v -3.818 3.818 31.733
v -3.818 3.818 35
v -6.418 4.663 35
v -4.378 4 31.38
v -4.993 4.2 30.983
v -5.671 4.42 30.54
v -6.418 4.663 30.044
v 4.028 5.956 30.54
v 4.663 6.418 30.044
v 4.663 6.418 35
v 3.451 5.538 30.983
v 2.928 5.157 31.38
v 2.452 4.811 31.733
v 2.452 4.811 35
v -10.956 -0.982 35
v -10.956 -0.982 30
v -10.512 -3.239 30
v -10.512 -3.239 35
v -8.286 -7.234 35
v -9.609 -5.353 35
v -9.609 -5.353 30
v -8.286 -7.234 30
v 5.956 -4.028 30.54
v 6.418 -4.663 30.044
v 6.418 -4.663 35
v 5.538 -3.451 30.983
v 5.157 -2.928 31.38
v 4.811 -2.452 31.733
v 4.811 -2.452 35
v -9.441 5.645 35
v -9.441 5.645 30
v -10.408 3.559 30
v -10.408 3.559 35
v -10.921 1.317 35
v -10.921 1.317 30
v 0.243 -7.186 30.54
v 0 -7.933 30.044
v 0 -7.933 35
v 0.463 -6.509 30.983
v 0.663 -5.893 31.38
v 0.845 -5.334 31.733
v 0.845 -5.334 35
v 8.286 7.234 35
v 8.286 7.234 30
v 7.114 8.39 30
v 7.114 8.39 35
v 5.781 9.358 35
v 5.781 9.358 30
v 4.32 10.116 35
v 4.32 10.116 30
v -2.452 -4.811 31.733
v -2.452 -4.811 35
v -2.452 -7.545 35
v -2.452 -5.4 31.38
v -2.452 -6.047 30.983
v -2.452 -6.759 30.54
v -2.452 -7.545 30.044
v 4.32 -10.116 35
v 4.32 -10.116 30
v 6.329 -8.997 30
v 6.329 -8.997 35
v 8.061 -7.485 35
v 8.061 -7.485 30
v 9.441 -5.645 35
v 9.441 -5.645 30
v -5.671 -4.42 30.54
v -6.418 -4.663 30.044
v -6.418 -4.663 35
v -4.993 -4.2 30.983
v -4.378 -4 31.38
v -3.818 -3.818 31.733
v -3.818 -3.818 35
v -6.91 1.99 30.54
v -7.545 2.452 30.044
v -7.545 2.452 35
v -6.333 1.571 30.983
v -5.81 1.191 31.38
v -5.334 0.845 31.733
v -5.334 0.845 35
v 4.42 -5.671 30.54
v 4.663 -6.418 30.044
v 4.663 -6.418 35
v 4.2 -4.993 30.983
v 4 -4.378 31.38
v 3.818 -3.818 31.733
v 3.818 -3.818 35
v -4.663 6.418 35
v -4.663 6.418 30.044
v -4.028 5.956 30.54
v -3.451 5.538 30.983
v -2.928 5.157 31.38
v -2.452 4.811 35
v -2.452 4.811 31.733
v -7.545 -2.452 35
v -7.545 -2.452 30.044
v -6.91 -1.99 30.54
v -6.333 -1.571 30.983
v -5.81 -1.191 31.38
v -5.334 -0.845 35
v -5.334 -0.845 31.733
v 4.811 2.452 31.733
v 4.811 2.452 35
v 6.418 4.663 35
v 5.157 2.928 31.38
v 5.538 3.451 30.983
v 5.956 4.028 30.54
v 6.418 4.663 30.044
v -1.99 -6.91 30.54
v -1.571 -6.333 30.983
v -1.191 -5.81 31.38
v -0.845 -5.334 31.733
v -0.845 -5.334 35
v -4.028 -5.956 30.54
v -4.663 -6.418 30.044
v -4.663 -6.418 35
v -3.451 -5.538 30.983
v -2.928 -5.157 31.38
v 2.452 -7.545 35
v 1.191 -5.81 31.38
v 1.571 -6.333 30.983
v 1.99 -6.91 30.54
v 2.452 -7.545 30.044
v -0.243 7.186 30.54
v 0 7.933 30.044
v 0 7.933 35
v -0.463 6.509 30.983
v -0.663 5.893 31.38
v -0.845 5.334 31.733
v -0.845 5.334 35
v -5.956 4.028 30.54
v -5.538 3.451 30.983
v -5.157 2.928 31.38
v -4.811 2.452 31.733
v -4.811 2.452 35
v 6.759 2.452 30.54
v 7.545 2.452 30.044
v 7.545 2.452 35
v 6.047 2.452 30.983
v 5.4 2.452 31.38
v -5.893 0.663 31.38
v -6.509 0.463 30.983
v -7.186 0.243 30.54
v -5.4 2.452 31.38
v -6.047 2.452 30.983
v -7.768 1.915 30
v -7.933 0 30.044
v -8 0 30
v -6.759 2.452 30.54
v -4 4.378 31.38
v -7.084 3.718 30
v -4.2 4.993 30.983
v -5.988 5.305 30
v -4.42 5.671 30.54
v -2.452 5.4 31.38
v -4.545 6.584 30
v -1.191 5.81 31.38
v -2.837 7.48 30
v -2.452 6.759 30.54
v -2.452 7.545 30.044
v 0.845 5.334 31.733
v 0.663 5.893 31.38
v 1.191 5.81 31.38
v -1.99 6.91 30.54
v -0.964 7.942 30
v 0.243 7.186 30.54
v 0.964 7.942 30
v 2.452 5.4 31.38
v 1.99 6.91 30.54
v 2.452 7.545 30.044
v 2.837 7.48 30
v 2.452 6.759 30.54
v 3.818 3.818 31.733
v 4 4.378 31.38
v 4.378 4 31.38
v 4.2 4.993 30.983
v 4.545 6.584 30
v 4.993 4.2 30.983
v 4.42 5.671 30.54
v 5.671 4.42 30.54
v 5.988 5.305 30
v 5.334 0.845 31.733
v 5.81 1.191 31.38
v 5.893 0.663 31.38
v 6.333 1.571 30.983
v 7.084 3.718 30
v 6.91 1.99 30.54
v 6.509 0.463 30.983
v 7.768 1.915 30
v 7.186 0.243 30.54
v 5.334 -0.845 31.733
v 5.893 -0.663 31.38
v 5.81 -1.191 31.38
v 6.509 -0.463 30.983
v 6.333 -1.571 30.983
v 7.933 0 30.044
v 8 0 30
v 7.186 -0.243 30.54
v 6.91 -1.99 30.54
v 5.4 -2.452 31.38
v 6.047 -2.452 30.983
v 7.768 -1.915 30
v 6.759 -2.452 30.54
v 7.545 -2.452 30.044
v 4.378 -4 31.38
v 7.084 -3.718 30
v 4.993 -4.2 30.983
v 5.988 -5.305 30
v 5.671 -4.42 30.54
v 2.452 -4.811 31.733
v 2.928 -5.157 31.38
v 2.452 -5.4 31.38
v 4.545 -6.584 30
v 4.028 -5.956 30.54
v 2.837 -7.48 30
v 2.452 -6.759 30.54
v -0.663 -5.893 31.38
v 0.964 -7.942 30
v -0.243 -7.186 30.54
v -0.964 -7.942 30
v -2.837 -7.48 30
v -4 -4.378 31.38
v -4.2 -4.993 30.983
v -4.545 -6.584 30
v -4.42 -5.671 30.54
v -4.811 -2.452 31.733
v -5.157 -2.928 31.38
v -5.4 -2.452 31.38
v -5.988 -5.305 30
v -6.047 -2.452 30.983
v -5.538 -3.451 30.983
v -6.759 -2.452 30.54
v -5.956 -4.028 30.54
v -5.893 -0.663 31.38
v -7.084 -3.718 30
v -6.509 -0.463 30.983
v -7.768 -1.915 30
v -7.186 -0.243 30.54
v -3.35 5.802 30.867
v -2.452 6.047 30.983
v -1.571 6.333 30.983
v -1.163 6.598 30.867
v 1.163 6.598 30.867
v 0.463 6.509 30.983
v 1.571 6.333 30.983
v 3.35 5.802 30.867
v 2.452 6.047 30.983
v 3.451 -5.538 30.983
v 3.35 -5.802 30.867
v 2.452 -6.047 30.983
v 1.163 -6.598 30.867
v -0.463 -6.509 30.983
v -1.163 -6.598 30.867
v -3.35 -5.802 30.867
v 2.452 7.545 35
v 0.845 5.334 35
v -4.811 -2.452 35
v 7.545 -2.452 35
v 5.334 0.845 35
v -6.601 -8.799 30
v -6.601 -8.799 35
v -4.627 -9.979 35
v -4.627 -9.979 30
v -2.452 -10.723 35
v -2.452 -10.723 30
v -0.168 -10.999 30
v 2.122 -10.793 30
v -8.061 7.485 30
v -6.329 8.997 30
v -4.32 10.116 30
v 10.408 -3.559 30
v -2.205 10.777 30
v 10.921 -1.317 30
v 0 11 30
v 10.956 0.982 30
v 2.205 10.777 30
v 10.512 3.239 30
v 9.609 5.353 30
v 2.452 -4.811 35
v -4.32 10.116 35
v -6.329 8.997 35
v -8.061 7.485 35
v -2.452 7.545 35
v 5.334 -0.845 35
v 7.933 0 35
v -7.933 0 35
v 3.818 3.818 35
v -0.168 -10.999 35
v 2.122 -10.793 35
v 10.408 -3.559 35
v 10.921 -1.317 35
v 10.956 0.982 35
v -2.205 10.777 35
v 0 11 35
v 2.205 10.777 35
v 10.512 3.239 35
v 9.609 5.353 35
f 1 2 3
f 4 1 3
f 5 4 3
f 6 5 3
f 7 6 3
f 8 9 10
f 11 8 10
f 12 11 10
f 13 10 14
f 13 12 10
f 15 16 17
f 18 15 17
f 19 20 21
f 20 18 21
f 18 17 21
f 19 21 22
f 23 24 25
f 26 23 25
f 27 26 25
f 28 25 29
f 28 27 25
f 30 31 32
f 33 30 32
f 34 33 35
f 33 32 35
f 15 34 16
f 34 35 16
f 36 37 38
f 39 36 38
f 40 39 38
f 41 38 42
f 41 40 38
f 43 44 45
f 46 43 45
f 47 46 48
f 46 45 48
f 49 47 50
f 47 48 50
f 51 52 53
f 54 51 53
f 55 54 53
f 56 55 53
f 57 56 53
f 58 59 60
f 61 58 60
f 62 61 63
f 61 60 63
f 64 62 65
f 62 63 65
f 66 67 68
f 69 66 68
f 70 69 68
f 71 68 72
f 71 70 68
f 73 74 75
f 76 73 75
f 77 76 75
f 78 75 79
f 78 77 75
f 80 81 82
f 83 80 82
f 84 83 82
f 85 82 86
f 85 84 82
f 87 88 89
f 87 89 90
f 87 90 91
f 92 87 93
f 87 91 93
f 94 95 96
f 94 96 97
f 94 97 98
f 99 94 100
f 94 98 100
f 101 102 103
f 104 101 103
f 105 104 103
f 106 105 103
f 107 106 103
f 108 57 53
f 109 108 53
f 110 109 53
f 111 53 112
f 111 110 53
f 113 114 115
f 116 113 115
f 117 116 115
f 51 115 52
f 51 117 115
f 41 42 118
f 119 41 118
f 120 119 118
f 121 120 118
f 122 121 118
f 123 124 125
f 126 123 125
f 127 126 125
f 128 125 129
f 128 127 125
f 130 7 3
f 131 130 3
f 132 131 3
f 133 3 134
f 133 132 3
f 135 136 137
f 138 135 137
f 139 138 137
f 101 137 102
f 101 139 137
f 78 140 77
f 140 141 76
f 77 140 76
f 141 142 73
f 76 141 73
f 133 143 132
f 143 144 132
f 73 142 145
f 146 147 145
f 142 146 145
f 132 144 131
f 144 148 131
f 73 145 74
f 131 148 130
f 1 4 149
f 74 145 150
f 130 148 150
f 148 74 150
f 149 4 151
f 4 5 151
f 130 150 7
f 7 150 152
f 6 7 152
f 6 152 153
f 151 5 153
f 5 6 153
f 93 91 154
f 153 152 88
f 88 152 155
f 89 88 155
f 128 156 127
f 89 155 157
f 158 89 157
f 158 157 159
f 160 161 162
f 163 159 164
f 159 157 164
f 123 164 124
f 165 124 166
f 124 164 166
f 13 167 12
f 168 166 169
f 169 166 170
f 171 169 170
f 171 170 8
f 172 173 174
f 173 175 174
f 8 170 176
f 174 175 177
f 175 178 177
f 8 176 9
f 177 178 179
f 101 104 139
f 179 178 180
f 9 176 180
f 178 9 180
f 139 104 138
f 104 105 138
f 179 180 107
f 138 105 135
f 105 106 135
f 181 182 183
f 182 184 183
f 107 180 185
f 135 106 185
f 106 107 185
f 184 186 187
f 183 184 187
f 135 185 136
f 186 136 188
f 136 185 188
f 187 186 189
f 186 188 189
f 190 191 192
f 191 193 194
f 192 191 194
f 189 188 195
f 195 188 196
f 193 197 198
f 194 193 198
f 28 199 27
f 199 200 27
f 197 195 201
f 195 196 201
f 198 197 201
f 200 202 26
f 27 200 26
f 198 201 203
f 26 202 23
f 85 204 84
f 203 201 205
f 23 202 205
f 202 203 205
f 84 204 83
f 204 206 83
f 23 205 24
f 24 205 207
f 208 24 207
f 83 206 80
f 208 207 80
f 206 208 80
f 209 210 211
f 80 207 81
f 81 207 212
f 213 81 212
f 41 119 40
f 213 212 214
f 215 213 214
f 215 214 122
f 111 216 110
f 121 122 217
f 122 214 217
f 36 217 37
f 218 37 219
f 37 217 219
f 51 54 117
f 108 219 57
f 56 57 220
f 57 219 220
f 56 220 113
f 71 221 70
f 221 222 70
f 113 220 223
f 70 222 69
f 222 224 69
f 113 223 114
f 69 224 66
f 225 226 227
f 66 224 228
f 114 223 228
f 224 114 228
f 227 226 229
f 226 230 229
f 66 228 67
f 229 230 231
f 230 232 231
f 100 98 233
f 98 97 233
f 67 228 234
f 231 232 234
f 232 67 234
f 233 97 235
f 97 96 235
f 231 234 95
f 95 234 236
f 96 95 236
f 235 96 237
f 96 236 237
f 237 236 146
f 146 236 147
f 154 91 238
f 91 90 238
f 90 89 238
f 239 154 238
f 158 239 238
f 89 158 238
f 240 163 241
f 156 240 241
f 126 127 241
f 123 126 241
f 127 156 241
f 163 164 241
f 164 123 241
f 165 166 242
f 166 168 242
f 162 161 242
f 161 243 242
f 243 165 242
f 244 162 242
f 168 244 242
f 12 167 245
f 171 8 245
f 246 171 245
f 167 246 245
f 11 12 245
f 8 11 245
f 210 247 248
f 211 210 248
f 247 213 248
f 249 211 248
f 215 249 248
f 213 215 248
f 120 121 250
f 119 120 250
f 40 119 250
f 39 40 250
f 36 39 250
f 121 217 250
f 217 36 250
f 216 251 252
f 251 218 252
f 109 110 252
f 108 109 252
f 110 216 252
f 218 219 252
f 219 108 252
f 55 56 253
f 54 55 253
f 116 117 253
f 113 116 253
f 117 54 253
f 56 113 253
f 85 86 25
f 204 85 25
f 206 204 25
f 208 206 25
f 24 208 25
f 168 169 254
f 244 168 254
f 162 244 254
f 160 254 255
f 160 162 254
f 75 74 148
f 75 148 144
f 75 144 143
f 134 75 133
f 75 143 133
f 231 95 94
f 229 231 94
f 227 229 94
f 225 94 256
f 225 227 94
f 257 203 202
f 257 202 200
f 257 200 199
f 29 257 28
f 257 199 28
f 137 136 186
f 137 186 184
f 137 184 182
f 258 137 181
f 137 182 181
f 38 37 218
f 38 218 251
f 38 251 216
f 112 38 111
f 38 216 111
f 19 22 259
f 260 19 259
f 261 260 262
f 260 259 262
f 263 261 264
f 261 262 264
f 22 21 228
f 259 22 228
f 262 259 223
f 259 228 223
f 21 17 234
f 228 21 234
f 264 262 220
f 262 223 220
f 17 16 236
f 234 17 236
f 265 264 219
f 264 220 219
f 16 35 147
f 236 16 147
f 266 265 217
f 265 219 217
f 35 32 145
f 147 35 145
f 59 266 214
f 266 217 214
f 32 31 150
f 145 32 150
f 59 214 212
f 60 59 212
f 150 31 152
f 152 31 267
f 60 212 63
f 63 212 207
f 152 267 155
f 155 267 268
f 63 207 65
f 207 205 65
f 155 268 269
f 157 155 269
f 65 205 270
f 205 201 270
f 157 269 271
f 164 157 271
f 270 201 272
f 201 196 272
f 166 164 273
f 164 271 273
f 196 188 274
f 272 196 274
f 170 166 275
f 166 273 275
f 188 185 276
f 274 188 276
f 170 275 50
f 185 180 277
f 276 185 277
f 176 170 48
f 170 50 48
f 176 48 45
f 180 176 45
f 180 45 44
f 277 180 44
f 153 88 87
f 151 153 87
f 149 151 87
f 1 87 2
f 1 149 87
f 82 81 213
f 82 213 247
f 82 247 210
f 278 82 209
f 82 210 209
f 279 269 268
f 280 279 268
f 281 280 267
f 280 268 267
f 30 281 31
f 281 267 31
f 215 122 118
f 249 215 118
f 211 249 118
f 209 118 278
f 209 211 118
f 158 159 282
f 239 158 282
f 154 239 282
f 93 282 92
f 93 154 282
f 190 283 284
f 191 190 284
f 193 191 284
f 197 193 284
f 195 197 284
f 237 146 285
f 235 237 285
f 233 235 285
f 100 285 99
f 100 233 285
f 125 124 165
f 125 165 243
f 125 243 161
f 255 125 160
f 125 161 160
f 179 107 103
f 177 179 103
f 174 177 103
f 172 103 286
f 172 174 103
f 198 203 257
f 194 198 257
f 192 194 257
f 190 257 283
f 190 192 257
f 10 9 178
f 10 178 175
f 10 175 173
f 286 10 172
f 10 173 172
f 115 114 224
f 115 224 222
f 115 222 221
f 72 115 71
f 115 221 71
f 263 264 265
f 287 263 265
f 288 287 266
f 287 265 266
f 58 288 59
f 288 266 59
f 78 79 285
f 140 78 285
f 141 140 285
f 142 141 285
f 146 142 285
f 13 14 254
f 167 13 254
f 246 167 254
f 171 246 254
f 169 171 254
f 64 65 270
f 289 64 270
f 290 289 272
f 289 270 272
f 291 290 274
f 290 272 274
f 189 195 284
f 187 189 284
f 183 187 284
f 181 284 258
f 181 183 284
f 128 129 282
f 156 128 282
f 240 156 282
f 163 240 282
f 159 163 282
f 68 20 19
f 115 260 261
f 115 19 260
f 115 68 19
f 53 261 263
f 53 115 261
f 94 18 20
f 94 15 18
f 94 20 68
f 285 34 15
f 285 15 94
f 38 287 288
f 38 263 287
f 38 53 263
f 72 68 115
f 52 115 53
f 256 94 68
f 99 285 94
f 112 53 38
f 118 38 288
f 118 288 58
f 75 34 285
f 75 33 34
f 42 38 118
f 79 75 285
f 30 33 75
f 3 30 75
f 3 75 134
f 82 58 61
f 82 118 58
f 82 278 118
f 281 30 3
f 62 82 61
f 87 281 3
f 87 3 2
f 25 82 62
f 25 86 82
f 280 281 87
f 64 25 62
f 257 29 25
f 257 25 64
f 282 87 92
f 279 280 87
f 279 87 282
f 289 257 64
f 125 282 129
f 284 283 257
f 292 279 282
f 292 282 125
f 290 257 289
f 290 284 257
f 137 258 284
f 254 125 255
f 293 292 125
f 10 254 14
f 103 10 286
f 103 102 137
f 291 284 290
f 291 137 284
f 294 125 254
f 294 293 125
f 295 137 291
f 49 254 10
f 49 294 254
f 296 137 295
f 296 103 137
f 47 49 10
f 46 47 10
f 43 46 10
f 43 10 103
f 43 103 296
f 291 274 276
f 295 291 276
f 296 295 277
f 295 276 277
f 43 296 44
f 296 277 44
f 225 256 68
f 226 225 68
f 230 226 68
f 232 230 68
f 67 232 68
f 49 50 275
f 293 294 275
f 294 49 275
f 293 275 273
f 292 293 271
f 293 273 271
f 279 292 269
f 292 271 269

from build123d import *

# Parameters (mm, degrees)
PAD016_DEPTH          = 5
POLARPATTERN013_COUNT = 10


with BuildPart() as part:
    # Sketch022 → Pad016 (new body)
    with BuildSketch(Plane.XY):
        with BuildLine():
            ThreePointArc((4.319673, 10.116344), (0, 11), (-4.319673, 10.116344))
            Line((-0.844746, 5.333517), (-4.319673, 10.116344))
            Line((0, 7.933378), (-0.844746, 5.333517))
            Line((0, 7.933378), (0.844746, 5.333517))
            Line((4.319673, 10.116344), (0.844746, 5.333517))
        make_face()
    pad016 = extrude(amount=PAD016_DEPTH)

    # PolarPattern013: Pad016 ×10 about axis
    polarpattern013_axis = Axis((0, 0, 0), (0, 0, 1))
    for i in range(1, POLARPATTERN013_COUNT):
        add(pad016.rotate(polarpattern013_axis, i * 360 / POLARPATTERN013_COUNT))

    # Cone003 → Cone003 (revolve, cut)
    with BuildSketch(Plane(origin=(0, 0, 2), x_dir=(-1, 0, 0), z_dir=(0, -1, 0))):
        Polygon((0, 0), (5, 0), (8, 2), (0, 2), align=None)
    revolve(axis=Axis((0, 0, 2), (0, 0, -1)), mode=Mode.SUBTRACT)


with BuildPart() as part_1:
    # Body028 placement: moved
    add(part.part.moved(Location((0, 0, 30))))


solid = part_1.part
